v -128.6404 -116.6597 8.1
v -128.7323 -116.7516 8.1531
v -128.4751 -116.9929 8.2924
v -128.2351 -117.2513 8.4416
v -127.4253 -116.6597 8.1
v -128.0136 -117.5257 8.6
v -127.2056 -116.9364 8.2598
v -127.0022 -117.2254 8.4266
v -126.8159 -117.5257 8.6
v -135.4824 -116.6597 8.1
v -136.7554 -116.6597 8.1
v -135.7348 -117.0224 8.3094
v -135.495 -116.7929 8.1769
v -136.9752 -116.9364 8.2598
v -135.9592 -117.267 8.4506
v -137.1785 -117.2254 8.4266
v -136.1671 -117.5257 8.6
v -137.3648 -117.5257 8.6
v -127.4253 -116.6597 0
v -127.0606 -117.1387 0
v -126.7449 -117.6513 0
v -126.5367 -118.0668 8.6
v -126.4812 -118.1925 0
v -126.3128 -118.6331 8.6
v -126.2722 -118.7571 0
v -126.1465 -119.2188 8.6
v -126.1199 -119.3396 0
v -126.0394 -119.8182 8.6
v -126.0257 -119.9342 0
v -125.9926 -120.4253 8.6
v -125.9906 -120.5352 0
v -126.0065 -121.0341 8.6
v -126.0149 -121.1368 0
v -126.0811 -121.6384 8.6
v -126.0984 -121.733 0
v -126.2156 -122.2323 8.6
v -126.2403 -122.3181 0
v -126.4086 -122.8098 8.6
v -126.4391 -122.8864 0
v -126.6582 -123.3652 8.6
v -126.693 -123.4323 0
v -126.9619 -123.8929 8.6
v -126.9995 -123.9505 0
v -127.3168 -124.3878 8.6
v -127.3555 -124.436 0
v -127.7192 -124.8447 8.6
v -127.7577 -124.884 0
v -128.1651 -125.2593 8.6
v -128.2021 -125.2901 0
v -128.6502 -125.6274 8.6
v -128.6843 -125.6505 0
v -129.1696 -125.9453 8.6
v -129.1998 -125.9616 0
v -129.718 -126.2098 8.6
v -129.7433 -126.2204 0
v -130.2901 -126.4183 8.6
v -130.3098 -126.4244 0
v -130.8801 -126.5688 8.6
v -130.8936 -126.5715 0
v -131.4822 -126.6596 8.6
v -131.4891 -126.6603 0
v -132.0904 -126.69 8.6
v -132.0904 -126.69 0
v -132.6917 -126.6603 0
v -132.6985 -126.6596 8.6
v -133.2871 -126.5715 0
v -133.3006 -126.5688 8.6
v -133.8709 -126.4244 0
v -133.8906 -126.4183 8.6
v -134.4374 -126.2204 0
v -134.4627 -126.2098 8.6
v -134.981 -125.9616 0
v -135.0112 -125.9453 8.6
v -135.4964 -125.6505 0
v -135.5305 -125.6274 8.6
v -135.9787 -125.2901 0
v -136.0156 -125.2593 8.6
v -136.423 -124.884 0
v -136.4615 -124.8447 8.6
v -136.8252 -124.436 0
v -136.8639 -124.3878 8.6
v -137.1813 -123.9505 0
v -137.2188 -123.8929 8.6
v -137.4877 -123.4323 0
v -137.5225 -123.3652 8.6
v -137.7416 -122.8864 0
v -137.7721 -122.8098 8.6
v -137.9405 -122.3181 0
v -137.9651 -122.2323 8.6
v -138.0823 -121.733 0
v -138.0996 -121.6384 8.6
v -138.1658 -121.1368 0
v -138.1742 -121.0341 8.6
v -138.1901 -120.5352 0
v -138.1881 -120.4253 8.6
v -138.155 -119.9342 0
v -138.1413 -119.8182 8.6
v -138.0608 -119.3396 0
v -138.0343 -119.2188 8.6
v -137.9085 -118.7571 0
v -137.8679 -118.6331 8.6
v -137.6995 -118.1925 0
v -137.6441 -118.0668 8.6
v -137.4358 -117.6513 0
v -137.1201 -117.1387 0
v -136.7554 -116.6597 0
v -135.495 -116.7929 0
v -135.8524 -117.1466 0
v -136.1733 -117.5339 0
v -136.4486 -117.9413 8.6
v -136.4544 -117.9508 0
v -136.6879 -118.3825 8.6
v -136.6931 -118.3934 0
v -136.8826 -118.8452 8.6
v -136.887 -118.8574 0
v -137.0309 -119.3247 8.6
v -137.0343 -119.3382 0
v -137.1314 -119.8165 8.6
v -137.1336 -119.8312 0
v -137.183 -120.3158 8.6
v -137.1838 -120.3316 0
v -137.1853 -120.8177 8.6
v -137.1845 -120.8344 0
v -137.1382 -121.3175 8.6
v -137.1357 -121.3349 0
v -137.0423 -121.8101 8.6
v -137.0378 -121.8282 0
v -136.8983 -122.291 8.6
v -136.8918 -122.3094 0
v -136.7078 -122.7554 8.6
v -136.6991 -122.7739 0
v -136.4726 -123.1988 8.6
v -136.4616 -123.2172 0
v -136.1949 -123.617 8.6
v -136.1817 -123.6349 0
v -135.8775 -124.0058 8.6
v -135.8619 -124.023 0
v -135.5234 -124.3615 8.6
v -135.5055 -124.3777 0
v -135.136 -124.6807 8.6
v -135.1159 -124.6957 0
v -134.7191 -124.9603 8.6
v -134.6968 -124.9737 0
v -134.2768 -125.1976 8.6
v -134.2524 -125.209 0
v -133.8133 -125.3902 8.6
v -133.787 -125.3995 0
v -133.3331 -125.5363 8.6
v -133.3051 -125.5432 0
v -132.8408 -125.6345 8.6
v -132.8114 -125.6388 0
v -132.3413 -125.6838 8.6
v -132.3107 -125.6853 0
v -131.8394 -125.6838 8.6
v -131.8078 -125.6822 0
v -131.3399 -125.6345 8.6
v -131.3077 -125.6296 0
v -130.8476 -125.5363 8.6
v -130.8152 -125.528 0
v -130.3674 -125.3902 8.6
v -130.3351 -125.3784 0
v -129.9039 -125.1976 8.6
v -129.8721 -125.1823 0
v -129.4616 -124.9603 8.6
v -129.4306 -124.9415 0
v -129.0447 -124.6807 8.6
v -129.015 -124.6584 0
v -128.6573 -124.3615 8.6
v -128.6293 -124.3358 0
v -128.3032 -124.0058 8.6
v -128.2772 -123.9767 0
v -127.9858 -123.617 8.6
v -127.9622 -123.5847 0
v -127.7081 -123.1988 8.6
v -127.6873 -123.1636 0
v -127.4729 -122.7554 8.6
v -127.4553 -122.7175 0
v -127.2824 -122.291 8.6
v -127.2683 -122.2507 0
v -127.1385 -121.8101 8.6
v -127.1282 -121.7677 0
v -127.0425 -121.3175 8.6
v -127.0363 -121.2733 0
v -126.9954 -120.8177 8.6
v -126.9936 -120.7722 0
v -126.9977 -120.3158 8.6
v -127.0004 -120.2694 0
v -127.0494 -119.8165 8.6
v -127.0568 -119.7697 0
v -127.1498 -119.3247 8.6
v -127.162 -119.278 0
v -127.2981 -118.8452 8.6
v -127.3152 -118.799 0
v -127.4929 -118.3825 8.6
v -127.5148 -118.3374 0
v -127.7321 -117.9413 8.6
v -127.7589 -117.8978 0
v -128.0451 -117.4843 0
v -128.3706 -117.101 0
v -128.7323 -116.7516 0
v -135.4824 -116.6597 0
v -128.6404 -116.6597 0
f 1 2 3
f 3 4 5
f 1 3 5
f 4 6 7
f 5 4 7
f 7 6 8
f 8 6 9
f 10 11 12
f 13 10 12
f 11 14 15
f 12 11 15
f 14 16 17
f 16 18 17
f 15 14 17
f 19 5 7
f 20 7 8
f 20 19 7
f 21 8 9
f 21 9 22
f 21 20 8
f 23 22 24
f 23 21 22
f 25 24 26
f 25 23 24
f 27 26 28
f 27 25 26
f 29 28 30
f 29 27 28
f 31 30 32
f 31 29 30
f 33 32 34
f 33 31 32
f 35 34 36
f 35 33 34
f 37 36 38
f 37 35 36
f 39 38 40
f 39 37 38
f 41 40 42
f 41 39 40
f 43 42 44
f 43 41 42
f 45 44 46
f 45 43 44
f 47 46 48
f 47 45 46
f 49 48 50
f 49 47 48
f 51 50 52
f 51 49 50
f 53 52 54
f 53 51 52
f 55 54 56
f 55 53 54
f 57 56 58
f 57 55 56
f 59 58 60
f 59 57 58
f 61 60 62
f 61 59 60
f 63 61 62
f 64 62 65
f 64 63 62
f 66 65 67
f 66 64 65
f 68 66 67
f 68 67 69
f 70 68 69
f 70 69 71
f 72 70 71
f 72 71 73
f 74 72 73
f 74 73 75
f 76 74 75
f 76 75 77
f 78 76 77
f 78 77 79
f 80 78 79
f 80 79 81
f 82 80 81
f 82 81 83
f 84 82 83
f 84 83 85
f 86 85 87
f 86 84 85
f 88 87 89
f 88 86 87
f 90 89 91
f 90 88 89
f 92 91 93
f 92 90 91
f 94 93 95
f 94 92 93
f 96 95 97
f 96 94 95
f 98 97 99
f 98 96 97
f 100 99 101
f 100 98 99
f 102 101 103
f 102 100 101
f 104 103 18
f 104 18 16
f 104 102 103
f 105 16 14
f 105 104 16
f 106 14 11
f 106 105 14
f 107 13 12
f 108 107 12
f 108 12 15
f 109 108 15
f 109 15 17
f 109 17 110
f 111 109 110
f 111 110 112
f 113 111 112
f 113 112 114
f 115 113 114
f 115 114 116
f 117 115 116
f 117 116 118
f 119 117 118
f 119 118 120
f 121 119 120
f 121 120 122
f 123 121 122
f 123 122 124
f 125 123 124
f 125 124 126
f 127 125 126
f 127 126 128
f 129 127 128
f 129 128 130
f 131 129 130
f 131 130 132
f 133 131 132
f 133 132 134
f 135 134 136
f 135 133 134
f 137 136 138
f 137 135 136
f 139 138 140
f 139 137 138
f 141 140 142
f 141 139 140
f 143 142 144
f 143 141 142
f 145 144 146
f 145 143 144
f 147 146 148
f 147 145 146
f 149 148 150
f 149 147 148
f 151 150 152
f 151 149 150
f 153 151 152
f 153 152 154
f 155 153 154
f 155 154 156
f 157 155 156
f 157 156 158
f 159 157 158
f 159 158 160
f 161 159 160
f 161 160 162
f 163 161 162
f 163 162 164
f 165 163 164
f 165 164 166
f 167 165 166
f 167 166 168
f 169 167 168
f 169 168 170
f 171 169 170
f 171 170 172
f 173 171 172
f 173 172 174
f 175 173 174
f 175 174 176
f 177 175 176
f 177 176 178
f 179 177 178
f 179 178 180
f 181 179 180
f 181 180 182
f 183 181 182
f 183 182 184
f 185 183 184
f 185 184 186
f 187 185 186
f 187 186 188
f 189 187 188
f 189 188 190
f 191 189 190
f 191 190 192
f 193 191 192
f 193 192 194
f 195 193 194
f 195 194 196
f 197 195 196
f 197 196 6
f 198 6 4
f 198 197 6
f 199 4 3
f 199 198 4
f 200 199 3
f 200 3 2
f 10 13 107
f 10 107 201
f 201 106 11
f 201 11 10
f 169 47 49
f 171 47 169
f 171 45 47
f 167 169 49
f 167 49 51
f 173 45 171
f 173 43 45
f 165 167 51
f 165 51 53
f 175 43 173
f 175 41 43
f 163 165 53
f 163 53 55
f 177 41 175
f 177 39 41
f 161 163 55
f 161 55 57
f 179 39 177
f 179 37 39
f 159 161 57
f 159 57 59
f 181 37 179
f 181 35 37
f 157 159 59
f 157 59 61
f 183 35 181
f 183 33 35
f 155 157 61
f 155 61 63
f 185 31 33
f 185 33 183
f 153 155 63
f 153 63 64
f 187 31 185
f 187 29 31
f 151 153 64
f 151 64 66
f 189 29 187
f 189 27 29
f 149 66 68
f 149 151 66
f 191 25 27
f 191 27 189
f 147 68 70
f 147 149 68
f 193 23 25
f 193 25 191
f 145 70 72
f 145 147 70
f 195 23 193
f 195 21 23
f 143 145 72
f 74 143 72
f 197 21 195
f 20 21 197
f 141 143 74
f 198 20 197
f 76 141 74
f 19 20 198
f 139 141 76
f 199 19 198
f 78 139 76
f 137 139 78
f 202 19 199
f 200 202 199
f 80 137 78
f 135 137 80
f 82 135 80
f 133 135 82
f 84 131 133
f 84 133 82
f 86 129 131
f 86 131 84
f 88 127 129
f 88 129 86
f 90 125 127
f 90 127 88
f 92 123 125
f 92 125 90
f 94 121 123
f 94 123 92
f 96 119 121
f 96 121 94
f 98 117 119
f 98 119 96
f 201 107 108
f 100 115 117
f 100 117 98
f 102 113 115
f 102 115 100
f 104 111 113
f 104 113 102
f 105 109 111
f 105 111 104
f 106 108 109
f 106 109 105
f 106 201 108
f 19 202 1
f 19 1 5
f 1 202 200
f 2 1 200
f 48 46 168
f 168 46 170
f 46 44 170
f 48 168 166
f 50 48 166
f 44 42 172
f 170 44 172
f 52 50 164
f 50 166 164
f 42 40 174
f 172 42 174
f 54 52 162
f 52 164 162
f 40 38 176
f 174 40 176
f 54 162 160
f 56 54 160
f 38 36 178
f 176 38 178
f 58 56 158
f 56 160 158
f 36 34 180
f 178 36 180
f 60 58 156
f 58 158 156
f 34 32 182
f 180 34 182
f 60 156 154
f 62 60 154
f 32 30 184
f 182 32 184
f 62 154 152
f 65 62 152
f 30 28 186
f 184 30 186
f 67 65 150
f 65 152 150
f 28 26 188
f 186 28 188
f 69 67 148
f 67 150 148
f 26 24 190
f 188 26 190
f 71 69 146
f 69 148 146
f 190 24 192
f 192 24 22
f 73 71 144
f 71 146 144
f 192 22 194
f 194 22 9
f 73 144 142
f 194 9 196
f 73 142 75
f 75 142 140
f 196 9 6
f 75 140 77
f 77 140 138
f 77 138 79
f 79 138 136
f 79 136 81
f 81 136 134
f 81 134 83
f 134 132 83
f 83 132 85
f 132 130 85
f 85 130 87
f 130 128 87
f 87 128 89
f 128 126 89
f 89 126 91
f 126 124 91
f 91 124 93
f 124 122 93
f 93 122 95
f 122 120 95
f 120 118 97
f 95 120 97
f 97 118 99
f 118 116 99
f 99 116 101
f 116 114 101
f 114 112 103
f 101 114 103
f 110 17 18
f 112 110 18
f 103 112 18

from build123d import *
from OCP.BRepFilletAPI import BRepFilletAPI_MakeChamfer

# Parameters (mm, degrees)
EXTRUDE_1_DEPTH  = 8.6
CHAMFER_1_SIZE   = 0.5
CHAMFER_1_SIZE2  = 0.866025404
CHAMFER_2_SIZE   = 0.142054737
CHAMFER_2_SIZE_2 = 0.2


with BuildPart() as part:
    # 草图1 → 凸台-拉伸1 (new body)
    with BuildSketch(Plane.XY):
        with BuildLine():
            Line((-128.840361964, -116.659683115), (-127.425332489, -116.659683115))
            ThreePointArc((-127.425332489, -116.659683115), (-132.090361964, -126.69001389), (-136.755391439, -116.659683115))
            Line((-136.755391439, -116.659683115), (-135.340361964, -116.659683115))
            ThreePointArc((-135.340361964, -116.659683115), (-132.090361964, -125.69001389), (-128.840361964, -116.659683115))
        make_face()
    extrude(amount=EXTRUDE_1_DEPTH)

    # 倒角1: one chamfer whose edges measure the first distance from different faces: ONE call of the kernel's chamfer builder (chamfer() names one face for all edges)
    chamfer_1_edges_1 = [part.edges().sort_by_distance(p)[0] for p in [
        (-136.047876701, -116.659683115, 8.6),
    ]]
    chamfer_1_side_1 = [part.faces().sort_by_distance(p)[0] for p in [
        (-136.047876701, -116.659683115, 4.3),
    ]]
    chamfer_1_edges_2 = [part.edges().sort_by_distance(p)[0] for p in [
        (-128.132847227, -116.659683115, 8.6),
    ]]
    chamfer_1_side_2 = [part.faces().sort_by_distance(p)[0] for p in [
        (-128.132847227, -116.659683115, 4.3),
    ]]
    chamfer_1 = BRepFilletAPI_MakeChamfer(part.part.solid().wrapped)
    for e in chamfer_1_edges_1:
        chamfer_1.Add(CHAMFER_1_SIZE, CHAMFER_1_SIZE2, e.wrapped, chamfer_1_side_1[0].wrapped)  # the first distance lies on this face
    for e in chamfer_1_edges_2:
        chamfer_1.Add(CHAMFER_1_SIZE, CHAMFER_1_SIZE2, e.wrapped, chamfer_1_side_2[0].wrapped)  # the first distance lies on this face
    add(Compound.cast(chamfer_1.Shape()), mode=Mode.REPLACE)

    # 倒角2
    # the kernel refuses this chamfer: 0.2, 0.142054737 mm, written as the material it takes off along each edge
    with BuildSketch(Plane(origin=(-135.340361964, -116.659683115, -0.524920029), x_dir=(-0.7577457918240572, -0.6525498563120925, 0), z_dir=(0, 0, 1))) as chamfer_2_piece_1:
        with BuildLine():
            Line((0.204125918, 0), (CHAMFER_2_SIZE * 0.757745791973, -CHAMFER_2_SIZE * 0.65254985644))
            Line((CHAMFER_2_SIZE * 0.757745791973, -CHAMFER_2_SIZE * 0.65254985644), (0, 0))
            ThreePointArc((0, 0), (0.104949569, -0.001020545), (0.204125918, 0))
        make_face()
    extrude(amount=9.149840059, mode=Mode.SUBTRACT)
    with BuildSketch(Plane(origin=(-128.840361964, -116.659683115, -0.514336598), x_dir=(1, 0, 0), z_dir=(0, 0, 1))) as chamfer_2_piece_2:
        with BuildLine():
            Line((CHAMFER_2_SIZE_2, 0), (0.108073152, -0.091926848))
            ThreePointArc((0.108073152, -0.091926848), (0.054110864, -0.045378858), (0, 0))
            Line((0, 0), (CHAMFER_2_SIZE_2, 0))
        make_face()
    extrude(amount=9.128673195, mode=Mode.SUBTRACT)


solid = part.part
